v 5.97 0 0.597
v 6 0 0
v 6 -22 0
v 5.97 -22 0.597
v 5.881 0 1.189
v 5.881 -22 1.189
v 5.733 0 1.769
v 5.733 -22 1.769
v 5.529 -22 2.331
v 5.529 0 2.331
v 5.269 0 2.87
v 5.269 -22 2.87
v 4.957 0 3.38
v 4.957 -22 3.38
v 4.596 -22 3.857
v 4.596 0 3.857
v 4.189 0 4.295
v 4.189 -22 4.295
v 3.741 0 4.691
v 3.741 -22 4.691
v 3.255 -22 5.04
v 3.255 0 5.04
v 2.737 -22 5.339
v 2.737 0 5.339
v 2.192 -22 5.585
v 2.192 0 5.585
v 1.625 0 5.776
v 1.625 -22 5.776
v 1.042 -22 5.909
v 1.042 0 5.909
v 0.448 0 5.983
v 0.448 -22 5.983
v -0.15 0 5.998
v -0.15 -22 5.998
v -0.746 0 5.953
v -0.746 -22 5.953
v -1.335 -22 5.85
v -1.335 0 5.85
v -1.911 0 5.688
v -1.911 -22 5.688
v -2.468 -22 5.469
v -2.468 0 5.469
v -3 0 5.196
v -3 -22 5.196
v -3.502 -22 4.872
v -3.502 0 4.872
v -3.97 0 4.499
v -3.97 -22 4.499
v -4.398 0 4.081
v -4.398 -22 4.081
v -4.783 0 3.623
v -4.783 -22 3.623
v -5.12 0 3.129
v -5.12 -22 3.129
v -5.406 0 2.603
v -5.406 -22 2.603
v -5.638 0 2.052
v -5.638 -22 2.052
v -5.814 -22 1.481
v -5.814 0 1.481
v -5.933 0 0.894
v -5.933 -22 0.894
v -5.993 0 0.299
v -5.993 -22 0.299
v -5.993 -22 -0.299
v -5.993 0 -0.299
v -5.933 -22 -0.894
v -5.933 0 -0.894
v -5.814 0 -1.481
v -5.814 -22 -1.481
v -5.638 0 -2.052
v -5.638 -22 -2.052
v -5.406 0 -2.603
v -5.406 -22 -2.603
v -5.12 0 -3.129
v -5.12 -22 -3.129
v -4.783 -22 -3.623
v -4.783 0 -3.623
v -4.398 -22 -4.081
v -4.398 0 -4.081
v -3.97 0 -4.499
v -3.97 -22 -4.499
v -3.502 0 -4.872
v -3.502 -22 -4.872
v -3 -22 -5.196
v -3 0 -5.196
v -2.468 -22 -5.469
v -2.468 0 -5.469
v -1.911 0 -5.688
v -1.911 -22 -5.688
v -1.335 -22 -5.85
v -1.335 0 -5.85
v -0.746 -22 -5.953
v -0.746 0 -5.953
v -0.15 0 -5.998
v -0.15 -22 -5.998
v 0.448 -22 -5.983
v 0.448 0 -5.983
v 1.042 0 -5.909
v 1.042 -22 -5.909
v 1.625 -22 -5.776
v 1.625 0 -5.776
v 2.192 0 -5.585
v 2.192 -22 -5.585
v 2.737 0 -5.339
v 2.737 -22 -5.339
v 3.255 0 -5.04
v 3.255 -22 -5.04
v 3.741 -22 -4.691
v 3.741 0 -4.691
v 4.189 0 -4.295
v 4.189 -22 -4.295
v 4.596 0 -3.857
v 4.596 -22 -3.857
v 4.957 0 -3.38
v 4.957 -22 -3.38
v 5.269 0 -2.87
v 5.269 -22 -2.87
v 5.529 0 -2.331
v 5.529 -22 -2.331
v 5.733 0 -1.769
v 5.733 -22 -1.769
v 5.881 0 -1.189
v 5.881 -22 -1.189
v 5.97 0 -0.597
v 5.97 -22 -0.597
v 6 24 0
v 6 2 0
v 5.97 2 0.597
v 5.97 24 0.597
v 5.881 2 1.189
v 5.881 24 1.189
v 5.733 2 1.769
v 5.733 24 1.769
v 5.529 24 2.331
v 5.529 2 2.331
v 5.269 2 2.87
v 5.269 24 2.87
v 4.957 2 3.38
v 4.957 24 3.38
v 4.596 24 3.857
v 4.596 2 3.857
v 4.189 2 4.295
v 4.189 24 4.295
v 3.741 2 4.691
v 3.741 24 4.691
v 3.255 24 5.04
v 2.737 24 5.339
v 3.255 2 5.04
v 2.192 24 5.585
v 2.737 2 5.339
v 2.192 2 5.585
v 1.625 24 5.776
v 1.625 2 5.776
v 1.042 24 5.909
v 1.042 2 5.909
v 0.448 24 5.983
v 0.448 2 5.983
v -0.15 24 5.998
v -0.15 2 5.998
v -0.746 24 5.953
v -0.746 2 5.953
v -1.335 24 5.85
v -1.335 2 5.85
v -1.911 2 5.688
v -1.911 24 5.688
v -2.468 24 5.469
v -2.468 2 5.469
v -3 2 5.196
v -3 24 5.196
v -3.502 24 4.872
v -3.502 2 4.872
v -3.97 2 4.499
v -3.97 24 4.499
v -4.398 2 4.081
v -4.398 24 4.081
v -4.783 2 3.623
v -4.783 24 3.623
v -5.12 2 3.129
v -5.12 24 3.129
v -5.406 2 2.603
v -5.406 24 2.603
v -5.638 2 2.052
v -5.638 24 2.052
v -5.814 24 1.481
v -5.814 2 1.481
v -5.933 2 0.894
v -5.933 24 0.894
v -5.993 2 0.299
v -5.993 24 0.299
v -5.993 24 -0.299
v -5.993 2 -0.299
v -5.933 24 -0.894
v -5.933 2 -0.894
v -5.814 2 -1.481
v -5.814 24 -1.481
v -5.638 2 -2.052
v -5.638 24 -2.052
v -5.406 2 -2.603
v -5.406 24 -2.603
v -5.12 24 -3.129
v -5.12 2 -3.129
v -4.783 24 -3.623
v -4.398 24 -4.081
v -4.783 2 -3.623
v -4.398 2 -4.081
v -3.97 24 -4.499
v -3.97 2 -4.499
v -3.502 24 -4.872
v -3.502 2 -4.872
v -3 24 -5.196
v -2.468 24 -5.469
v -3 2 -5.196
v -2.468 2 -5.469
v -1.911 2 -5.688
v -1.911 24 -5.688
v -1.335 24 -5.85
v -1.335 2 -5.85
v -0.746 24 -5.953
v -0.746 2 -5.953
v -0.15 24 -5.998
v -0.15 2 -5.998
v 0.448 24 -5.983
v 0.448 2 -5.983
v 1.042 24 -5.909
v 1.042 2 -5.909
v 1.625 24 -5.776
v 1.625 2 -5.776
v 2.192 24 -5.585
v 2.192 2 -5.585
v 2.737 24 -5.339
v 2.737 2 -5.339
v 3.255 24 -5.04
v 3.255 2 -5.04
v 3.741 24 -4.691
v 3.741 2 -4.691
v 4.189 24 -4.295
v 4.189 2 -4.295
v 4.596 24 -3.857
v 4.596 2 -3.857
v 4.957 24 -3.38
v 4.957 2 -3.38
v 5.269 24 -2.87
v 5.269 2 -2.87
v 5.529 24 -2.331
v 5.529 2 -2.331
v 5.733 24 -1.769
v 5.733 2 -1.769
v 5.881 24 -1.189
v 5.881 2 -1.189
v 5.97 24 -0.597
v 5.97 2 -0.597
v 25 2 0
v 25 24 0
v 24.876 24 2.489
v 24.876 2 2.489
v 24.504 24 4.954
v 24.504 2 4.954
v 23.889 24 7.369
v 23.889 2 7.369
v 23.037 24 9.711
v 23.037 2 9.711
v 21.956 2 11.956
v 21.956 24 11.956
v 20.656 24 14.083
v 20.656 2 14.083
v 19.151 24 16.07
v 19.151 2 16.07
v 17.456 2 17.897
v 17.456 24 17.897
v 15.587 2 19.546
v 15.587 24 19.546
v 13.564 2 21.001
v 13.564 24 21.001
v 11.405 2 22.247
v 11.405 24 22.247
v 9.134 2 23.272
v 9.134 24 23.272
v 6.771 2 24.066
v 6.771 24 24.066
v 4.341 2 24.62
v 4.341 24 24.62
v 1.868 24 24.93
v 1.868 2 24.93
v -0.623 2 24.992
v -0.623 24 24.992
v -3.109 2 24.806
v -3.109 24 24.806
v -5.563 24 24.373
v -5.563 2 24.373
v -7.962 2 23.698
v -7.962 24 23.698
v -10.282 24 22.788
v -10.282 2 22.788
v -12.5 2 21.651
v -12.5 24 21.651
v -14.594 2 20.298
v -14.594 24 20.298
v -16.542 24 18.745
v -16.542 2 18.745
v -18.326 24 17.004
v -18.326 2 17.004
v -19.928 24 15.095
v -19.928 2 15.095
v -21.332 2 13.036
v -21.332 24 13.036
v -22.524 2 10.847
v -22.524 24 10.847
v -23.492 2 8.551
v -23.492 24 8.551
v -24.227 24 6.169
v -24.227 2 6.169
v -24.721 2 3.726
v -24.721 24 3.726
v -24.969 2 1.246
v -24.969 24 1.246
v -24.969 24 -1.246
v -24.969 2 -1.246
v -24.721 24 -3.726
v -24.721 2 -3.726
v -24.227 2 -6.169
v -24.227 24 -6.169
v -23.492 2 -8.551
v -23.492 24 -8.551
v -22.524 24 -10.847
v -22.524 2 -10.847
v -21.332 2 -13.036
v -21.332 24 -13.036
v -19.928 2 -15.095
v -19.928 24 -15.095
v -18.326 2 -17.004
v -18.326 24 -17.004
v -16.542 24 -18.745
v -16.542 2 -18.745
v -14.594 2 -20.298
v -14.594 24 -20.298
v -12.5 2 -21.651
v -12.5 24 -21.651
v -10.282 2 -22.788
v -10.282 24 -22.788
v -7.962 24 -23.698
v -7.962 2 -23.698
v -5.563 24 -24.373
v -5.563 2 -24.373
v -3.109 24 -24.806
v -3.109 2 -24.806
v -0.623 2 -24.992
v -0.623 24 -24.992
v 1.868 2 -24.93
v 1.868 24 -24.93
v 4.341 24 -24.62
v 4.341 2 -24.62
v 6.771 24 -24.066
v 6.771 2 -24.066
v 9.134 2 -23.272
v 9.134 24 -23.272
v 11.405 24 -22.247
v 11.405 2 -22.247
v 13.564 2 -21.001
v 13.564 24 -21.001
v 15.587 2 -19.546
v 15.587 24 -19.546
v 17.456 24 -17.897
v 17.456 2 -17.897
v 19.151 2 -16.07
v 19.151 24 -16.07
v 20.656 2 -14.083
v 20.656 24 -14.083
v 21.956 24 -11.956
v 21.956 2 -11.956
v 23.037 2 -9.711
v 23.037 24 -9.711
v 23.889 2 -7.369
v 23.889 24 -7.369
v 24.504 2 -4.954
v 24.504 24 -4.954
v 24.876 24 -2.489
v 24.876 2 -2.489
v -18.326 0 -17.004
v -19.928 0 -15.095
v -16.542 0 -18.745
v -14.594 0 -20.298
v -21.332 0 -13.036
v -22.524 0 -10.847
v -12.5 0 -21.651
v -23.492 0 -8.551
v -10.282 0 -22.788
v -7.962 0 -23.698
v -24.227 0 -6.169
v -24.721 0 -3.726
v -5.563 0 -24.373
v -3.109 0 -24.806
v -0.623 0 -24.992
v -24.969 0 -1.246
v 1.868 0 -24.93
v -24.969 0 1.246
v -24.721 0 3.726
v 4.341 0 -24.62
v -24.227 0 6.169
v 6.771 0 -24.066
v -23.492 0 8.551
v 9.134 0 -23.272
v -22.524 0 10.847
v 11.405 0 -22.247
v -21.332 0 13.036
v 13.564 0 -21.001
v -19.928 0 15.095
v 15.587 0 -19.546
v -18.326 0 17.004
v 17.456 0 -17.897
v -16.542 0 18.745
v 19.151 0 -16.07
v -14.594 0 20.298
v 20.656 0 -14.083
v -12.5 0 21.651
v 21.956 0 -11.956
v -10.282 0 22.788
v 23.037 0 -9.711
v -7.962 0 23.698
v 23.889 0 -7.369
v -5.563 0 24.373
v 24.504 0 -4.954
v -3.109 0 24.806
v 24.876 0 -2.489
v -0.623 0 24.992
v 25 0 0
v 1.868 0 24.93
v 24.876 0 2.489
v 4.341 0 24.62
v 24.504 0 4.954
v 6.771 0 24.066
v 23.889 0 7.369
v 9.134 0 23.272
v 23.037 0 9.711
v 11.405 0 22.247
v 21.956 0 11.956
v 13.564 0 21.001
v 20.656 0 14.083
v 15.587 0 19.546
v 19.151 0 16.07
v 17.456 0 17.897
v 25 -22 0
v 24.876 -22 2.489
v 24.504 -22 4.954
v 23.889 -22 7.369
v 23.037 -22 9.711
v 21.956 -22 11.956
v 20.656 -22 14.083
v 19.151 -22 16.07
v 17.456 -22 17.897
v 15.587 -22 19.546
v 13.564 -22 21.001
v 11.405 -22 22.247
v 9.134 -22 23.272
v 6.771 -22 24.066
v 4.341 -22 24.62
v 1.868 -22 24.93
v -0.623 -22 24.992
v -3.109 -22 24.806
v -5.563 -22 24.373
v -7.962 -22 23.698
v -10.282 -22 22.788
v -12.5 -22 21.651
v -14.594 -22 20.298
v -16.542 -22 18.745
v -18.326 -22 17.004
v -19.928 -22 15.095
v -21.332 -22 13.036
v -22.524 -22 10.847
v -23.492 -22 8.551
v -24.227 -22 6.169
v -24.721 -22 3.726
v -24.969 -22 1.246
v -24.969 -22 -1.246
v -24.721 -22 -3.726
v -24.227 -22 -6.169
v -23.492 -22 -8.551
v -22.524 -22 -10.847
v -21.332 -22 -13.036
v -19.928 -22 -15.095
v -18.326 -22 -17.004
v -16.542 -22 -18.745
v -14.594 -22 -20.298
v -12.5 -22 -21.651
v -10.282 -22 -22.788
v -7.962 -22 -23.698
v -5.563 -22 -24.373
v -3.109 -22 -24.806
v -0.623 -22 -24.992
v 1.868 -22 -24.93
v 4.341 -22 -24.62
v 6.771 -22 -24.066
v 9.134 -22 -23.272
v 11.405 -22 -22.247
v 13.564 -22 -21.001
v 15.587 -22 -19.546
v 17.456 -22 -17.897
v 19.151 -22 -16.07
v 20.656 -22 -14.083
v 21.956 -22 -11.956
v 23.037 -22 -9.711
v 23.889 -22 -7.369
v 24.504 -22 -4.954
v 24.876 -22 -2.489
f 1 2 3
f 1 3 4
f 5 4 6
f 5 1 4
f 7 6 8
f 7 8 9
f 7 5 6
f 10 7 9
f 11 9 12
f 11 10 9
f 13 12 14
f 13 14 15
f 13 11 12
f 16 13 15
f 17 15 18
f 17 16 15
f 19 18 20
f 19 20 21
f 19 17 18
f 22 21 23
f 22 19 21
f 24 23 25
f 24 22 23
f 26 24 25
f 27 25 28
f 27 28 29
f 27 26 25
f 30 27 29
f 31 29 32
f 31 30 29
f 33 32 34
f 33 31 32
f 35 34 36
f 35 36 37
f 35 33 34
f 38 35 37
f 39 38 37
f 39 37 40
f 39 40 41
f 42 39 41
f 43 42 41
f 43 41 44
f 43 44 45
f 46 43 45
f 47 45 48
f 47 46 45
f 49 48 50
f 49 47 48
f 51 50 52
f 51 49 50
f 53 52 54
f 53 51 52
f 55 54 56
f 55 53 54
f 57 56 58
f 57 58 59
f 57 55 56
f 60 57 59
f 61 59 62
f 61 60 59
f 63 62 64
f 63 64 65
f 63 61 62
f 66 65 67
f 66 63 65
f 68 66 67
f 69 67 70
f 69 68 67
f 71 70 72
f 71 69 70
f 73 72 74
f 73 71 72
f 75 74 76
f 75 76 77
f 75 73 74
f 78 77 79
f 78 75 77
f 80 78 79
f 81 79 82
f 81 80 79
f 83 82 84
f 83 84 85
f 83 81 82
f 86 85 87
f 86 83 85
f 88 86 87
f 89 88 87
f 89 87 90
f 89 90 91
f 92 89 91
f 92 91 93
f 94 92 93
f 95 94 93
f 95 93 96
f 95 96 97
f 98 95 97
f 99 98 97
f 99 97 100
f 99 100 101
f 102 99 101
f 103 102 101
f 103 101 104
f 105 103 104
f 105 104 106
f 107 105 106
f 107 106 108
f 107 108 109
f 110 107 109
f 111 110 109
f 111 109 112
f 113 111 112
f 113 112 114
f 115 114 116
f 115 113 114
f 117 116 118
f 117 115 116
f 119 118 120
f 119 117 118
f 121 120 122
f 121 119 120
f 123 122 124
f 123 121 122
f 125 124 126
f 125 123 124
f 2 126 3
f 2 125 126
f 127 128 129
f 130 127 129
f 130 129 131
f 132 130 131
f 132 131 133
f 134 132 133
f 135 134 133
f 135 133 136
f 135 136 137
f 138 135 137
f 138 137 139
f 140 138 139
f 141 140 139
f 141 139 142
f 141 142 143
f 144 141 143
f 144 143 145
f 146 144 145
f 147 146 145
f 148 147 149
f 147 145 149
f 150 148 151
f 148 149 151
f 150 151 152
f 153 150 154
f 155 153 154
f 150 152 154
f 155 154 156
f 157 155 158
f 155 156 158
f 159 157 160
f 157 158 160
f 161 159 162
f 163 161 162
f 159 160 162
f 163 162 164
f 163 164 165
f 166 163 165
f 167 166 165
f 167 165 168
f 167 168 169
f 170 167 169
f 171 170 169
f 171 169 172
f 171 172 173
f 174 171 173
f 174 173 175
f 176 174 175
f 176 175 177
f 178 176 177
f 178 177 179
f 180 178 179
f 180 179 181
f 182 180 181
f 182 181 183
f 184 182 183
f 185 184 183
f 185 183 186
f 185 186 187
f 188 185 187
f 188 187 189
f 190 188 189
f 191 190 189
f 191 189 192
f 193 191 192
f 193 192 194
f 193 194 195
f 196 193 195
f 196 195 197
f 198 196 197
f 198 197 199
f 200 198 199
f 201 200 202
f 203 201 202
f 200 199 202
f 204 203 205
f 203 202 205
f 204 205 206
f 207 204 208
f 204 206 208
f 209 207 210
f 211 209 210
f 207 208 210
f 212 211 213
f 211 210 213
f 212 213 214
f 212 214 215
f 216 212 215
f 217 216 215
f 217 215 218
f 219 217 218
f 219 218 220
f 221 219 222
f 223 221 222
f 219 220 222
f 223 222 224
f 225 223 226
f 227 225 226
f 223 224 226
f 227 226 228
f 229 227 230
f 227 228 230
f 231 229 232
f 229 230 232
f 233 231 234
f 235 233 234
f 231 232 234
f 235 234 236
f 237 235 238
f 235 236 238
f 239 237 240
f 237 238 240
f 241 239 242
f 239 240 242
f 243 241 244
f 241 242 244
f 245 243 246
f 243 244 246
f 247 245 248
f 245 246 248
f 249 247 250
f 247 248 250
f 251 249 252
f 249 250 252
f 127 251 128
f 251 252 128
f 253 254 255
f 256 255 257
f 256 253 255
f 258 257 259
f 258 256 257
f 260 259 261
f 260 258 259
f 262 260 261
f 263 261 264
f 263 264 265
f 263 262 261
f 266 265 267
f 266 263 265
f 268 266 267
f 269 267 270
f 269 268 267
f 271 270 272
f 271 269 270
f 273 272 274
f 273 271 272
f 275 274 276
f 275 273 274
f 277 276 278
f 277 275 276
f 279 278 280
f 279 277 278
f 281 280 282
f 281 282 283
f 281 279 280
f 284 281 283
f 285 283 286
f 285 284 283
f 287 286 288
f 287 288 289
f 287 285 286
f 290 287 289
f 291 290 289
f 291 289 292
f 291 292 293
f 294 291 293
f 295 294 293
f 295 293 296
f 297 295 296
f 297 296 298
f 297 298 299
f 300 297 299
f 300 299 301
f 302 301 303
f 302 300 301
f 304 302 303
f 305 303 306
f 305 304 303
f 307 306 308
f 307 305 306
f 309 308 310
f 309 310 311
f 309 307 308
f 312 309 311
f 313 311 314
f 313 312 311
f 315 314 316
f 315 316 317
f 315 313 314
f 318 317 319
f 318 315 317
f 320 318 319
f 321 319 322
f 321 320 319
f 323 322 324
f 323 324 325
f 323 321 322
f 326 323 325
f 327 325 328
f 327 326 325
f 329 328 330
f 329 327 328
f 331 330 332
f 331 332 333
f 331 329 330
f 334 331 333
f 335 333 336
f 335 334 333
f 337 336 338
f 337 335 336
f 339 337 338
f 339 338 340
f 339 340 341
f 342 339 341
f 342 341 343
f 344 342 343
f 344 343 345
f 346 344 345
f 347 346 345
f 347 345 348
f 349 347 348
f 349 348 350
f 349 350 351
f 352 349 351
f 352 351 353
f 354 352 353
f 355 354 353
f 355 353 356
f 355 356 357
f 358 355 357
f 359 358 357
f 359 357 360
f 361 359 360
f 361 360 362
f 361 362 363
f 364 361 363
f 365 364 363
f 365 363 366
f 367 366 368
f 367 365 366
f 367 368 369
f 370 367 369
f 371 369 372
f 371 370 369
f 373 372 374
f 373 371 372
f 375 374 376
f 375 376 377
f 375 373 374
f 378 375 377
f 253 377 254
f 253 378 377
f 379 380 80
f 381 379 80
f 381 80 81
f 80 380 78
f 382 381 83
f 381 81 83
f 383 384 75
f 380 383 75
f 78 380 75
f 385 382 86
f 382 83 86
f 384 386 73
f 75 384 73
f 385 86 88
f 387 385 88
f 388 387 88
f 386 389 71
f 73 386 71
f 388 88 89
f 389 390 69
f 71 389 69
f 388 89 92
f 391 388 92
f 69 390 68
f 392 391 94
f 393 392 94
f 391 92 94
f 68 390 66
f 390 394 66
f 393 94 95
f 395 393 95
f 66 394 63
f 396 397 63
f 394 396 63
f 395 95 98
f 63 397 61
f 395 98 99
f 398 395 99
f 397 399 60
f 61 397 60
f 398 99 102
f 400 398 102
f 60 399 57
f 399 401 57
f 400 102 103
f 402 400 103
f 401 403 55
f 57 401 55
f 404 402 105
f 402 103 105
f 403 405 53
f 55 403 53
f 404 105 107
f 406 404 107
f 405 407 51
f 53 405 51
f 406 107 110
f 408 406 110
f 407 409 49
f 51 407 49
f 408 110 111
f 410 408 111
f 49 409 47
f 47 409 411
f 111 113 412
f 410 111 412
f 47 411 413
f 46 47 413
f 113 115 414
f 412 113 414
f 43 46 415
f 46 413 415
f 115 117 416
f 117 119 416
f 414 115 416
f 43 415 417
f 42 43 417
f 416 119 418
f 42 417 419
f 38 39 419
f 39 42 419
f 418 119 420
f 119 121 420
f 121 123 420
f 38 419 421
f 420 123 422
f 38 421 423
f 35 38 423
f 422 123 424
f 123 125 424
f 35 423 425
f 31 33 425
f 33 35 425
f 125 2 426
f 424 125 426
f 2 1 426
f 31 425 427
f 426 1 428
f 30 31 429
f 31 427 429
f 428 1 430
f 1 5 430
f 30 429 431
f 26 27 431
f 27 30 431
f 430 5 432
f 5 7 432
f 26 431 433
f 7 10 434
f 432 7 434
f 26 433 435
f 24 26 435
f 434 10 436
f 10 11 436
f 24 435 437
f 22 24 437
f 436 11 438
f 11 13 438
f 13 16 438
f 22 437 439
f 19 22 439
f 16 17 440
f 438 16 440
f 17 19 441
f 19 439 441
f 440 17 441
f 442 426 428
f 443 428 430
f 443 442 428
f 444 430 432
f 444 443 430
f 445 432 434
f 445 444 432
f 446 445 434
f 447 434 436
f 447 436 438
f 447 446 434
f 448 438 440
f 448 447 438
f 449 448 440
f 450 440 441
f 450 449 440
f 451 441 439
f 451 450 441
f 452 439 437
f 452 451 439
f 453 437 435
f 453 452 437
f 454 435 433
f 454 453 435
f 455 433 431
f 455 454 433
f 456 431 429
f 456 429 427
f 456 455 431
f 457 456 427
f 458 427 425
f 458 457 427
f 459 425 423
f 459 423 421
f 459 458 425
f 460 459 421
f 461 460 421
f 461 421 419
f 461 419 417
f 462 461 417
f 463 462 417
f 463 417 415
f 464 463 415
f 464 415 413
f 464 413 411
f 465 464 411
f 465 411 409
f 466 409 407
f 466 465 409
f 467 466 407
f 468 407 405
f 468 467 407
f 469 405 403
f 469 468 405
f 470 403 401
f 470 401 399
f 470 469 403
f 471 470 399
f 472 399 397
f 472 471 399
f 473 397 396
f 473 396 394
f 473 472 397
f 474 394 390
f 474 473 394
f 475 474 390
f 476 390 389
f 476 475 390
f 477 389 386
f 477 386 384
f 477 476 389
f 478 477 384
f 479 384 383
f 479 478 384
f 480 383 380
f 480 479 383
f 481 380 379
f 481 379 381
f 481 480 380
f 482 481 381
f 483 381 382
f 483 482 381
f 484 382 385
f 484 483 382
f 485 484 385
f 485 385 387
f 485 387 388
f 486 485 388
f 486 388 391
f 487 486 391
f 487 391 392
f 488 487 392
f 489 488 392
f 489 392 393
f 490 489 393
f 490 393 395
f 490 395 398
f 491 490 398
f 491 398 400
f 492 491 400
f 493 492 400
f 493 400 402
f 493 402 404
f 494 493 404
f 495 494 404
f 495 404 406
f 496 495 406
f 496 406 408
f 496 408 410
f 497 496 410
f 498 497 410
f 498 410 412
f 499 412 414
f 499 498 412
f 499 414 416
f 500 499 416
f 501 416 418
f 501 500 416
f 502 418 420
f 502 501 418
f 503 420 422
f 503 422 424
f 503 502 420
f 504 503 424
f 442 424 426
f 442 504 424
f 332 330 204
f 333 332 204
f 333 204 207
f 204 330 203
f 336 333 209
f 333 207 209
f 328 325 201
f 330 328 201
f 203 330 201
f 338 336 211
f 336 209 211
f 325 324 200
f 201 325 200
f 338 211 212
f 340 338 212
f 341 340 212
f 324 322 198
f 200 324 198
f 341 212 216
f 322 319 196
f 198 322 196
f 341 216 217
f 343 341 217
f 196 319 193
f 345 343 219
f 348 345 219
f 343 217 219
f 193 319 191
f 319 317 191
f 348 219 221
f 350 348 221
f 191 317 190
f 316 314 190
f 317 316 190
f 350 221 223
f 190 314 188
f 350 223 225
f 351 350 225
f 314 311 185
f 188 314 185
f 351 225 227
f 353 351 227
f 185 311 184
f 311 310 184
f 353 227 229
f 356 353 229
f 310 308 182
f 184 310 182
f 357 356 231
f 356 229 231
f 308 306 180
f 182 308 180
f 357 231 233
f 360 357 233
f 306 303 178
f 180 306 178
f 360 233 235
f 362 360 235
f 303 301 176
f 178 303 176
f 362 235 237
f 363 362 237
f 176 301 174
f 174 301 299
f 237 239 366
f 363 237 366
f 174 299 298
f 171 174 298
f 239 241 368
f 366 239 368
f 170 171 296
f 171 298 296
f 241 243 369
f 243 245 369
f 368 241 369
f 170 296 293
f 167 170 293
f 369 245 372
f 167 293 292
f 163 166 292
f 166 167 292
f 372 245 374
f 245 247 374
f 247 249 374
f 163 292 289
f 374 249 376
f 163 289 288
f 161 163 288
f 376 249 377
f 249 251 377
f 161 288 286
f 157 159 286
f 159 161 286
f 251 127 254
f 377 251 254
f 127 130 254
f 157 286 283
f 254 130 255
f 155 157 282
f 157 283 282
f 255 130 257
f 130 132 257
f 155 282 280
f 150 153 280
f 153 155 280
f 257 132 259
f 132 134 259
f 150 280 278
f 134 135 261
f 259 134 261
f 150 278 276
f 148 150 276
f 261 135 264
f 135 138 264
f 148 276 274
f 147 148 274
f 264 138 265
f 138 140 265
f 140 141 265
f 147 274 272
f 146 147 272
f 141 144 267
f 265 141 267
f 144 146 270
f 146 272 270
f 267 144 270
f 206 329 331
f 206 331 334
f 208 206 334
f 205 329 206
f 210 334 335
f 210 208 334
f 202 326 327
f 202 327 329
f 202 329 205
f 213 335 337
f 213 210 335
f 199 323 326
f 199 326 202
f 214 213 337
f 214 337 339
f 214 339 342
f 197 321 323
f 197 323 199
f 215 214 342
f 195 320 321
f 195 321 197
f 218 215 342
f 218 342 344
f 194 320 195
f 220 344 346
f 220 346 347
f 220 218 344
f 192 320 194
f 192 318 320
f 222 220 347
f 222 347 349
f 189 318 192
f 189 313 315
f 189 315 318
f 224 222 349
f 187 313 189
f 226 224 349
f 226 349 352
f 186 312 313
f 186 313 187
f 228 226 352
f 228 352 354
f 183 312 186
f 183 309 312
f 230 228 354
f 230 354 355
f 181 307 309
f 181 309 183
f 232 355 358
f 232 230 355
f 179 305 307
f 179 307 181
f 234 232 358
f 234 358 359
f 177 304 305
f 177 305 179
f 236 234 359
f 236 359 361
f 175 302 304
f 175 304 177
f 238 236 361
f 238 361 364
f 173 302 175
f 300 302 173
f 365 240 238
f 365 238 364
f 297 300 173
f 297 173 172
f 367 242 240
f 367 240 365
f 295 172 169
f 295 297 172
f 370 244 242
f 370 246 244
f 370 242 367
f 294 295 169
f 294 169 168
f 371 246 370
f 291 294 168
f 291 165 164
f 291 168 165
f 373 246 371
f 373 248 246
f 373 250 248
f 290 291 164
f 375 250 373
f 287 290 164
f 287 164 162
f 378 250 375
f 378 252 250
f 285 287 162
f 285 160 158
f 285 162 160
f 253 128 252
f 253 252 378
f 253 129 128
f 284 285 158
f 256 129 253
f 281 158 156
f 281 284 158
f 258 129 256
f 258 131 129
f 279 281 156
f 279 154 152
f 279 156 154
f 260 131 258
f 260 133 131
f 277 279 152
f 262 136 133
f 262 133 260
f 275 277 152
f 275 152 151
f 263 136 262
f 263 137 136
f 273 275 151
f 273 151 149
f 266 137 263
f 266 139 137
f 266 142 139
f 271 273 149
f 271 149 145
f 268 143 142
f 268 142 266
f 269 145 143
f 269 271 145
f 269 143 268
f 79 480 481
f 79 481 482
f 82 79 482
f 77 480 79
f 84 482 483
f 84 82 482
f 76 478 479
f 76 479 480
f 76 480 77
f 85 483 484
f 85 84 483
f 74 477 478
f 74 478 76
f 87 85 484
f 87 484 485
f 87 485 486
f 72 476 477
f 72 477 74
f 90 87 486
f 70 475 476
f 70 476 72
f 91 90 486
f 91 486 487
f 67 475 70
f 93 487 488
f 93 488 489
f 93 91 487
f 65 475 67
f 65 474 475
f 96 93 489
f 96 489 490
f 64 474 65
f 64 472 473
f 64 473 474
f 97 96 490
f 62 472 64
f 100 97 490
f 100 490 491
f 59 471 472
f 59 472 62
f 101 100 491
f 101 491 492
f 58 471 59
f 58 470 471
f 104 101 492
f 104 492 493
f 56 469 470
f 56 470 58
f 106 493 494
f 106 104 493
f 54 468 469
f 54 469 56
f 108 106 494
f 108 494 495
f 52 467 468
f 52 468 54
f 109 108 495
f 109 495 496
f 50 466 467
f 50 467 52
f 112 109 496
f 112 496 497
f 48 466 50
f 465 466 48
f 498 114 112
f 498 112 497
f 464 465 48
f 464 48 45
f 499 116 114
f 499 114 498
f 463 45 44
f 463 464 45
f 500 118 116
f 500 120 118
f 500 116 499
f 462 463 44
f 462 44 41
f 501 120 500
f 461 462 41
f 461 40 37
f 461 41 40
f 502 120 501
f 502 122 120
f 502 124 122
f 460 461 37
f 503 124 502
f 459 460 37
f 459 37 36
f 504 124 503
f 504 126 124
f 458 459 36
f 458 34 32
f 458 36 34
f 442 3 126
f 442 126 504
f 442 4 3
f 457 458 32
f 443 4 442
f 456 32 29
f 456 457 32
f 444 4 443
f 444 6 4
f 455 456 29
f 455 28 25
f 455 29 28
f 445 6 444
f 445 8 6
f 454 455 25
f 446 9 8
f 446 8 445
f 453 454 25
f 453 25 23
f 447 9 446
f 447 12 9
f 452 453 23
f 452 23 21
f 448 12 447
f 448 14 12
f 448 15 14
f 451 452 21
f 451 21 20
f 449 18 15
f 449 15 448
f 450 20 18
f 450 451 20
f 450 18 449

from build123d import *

# Parameters (mm, degrees)
F0_R          = 25
F0_R_2        = 6
F1_DEPTH      = 22
F1_DEPTH_BACK = 24
F2_DEPTH      = 2


with BuildPart() as f1:
    # F0 (on Front) → F1 (new body, two sides)
    with BuildSketch(Plane.XZ) as f1_sk:
        Circle(F0_R)
        Circle(F0_R_2, mode=Mode.SUBTRACT)
    extrude(amount=F1_DEPTH)
    extrude(f1_sk.sketch, amount=-F1_DEPTH_BACK)

    # F0 (on Front) → F2 (cut)
    with BuildSketch(Plane.XZ):
        Circle(F0_R)
        Circle(F0_R_2, mode=Mode.SUBTRACT)
    extrude(amount=-F2_DEPTH, mode=Mode.SUBTRACT)


solid = f1.part
